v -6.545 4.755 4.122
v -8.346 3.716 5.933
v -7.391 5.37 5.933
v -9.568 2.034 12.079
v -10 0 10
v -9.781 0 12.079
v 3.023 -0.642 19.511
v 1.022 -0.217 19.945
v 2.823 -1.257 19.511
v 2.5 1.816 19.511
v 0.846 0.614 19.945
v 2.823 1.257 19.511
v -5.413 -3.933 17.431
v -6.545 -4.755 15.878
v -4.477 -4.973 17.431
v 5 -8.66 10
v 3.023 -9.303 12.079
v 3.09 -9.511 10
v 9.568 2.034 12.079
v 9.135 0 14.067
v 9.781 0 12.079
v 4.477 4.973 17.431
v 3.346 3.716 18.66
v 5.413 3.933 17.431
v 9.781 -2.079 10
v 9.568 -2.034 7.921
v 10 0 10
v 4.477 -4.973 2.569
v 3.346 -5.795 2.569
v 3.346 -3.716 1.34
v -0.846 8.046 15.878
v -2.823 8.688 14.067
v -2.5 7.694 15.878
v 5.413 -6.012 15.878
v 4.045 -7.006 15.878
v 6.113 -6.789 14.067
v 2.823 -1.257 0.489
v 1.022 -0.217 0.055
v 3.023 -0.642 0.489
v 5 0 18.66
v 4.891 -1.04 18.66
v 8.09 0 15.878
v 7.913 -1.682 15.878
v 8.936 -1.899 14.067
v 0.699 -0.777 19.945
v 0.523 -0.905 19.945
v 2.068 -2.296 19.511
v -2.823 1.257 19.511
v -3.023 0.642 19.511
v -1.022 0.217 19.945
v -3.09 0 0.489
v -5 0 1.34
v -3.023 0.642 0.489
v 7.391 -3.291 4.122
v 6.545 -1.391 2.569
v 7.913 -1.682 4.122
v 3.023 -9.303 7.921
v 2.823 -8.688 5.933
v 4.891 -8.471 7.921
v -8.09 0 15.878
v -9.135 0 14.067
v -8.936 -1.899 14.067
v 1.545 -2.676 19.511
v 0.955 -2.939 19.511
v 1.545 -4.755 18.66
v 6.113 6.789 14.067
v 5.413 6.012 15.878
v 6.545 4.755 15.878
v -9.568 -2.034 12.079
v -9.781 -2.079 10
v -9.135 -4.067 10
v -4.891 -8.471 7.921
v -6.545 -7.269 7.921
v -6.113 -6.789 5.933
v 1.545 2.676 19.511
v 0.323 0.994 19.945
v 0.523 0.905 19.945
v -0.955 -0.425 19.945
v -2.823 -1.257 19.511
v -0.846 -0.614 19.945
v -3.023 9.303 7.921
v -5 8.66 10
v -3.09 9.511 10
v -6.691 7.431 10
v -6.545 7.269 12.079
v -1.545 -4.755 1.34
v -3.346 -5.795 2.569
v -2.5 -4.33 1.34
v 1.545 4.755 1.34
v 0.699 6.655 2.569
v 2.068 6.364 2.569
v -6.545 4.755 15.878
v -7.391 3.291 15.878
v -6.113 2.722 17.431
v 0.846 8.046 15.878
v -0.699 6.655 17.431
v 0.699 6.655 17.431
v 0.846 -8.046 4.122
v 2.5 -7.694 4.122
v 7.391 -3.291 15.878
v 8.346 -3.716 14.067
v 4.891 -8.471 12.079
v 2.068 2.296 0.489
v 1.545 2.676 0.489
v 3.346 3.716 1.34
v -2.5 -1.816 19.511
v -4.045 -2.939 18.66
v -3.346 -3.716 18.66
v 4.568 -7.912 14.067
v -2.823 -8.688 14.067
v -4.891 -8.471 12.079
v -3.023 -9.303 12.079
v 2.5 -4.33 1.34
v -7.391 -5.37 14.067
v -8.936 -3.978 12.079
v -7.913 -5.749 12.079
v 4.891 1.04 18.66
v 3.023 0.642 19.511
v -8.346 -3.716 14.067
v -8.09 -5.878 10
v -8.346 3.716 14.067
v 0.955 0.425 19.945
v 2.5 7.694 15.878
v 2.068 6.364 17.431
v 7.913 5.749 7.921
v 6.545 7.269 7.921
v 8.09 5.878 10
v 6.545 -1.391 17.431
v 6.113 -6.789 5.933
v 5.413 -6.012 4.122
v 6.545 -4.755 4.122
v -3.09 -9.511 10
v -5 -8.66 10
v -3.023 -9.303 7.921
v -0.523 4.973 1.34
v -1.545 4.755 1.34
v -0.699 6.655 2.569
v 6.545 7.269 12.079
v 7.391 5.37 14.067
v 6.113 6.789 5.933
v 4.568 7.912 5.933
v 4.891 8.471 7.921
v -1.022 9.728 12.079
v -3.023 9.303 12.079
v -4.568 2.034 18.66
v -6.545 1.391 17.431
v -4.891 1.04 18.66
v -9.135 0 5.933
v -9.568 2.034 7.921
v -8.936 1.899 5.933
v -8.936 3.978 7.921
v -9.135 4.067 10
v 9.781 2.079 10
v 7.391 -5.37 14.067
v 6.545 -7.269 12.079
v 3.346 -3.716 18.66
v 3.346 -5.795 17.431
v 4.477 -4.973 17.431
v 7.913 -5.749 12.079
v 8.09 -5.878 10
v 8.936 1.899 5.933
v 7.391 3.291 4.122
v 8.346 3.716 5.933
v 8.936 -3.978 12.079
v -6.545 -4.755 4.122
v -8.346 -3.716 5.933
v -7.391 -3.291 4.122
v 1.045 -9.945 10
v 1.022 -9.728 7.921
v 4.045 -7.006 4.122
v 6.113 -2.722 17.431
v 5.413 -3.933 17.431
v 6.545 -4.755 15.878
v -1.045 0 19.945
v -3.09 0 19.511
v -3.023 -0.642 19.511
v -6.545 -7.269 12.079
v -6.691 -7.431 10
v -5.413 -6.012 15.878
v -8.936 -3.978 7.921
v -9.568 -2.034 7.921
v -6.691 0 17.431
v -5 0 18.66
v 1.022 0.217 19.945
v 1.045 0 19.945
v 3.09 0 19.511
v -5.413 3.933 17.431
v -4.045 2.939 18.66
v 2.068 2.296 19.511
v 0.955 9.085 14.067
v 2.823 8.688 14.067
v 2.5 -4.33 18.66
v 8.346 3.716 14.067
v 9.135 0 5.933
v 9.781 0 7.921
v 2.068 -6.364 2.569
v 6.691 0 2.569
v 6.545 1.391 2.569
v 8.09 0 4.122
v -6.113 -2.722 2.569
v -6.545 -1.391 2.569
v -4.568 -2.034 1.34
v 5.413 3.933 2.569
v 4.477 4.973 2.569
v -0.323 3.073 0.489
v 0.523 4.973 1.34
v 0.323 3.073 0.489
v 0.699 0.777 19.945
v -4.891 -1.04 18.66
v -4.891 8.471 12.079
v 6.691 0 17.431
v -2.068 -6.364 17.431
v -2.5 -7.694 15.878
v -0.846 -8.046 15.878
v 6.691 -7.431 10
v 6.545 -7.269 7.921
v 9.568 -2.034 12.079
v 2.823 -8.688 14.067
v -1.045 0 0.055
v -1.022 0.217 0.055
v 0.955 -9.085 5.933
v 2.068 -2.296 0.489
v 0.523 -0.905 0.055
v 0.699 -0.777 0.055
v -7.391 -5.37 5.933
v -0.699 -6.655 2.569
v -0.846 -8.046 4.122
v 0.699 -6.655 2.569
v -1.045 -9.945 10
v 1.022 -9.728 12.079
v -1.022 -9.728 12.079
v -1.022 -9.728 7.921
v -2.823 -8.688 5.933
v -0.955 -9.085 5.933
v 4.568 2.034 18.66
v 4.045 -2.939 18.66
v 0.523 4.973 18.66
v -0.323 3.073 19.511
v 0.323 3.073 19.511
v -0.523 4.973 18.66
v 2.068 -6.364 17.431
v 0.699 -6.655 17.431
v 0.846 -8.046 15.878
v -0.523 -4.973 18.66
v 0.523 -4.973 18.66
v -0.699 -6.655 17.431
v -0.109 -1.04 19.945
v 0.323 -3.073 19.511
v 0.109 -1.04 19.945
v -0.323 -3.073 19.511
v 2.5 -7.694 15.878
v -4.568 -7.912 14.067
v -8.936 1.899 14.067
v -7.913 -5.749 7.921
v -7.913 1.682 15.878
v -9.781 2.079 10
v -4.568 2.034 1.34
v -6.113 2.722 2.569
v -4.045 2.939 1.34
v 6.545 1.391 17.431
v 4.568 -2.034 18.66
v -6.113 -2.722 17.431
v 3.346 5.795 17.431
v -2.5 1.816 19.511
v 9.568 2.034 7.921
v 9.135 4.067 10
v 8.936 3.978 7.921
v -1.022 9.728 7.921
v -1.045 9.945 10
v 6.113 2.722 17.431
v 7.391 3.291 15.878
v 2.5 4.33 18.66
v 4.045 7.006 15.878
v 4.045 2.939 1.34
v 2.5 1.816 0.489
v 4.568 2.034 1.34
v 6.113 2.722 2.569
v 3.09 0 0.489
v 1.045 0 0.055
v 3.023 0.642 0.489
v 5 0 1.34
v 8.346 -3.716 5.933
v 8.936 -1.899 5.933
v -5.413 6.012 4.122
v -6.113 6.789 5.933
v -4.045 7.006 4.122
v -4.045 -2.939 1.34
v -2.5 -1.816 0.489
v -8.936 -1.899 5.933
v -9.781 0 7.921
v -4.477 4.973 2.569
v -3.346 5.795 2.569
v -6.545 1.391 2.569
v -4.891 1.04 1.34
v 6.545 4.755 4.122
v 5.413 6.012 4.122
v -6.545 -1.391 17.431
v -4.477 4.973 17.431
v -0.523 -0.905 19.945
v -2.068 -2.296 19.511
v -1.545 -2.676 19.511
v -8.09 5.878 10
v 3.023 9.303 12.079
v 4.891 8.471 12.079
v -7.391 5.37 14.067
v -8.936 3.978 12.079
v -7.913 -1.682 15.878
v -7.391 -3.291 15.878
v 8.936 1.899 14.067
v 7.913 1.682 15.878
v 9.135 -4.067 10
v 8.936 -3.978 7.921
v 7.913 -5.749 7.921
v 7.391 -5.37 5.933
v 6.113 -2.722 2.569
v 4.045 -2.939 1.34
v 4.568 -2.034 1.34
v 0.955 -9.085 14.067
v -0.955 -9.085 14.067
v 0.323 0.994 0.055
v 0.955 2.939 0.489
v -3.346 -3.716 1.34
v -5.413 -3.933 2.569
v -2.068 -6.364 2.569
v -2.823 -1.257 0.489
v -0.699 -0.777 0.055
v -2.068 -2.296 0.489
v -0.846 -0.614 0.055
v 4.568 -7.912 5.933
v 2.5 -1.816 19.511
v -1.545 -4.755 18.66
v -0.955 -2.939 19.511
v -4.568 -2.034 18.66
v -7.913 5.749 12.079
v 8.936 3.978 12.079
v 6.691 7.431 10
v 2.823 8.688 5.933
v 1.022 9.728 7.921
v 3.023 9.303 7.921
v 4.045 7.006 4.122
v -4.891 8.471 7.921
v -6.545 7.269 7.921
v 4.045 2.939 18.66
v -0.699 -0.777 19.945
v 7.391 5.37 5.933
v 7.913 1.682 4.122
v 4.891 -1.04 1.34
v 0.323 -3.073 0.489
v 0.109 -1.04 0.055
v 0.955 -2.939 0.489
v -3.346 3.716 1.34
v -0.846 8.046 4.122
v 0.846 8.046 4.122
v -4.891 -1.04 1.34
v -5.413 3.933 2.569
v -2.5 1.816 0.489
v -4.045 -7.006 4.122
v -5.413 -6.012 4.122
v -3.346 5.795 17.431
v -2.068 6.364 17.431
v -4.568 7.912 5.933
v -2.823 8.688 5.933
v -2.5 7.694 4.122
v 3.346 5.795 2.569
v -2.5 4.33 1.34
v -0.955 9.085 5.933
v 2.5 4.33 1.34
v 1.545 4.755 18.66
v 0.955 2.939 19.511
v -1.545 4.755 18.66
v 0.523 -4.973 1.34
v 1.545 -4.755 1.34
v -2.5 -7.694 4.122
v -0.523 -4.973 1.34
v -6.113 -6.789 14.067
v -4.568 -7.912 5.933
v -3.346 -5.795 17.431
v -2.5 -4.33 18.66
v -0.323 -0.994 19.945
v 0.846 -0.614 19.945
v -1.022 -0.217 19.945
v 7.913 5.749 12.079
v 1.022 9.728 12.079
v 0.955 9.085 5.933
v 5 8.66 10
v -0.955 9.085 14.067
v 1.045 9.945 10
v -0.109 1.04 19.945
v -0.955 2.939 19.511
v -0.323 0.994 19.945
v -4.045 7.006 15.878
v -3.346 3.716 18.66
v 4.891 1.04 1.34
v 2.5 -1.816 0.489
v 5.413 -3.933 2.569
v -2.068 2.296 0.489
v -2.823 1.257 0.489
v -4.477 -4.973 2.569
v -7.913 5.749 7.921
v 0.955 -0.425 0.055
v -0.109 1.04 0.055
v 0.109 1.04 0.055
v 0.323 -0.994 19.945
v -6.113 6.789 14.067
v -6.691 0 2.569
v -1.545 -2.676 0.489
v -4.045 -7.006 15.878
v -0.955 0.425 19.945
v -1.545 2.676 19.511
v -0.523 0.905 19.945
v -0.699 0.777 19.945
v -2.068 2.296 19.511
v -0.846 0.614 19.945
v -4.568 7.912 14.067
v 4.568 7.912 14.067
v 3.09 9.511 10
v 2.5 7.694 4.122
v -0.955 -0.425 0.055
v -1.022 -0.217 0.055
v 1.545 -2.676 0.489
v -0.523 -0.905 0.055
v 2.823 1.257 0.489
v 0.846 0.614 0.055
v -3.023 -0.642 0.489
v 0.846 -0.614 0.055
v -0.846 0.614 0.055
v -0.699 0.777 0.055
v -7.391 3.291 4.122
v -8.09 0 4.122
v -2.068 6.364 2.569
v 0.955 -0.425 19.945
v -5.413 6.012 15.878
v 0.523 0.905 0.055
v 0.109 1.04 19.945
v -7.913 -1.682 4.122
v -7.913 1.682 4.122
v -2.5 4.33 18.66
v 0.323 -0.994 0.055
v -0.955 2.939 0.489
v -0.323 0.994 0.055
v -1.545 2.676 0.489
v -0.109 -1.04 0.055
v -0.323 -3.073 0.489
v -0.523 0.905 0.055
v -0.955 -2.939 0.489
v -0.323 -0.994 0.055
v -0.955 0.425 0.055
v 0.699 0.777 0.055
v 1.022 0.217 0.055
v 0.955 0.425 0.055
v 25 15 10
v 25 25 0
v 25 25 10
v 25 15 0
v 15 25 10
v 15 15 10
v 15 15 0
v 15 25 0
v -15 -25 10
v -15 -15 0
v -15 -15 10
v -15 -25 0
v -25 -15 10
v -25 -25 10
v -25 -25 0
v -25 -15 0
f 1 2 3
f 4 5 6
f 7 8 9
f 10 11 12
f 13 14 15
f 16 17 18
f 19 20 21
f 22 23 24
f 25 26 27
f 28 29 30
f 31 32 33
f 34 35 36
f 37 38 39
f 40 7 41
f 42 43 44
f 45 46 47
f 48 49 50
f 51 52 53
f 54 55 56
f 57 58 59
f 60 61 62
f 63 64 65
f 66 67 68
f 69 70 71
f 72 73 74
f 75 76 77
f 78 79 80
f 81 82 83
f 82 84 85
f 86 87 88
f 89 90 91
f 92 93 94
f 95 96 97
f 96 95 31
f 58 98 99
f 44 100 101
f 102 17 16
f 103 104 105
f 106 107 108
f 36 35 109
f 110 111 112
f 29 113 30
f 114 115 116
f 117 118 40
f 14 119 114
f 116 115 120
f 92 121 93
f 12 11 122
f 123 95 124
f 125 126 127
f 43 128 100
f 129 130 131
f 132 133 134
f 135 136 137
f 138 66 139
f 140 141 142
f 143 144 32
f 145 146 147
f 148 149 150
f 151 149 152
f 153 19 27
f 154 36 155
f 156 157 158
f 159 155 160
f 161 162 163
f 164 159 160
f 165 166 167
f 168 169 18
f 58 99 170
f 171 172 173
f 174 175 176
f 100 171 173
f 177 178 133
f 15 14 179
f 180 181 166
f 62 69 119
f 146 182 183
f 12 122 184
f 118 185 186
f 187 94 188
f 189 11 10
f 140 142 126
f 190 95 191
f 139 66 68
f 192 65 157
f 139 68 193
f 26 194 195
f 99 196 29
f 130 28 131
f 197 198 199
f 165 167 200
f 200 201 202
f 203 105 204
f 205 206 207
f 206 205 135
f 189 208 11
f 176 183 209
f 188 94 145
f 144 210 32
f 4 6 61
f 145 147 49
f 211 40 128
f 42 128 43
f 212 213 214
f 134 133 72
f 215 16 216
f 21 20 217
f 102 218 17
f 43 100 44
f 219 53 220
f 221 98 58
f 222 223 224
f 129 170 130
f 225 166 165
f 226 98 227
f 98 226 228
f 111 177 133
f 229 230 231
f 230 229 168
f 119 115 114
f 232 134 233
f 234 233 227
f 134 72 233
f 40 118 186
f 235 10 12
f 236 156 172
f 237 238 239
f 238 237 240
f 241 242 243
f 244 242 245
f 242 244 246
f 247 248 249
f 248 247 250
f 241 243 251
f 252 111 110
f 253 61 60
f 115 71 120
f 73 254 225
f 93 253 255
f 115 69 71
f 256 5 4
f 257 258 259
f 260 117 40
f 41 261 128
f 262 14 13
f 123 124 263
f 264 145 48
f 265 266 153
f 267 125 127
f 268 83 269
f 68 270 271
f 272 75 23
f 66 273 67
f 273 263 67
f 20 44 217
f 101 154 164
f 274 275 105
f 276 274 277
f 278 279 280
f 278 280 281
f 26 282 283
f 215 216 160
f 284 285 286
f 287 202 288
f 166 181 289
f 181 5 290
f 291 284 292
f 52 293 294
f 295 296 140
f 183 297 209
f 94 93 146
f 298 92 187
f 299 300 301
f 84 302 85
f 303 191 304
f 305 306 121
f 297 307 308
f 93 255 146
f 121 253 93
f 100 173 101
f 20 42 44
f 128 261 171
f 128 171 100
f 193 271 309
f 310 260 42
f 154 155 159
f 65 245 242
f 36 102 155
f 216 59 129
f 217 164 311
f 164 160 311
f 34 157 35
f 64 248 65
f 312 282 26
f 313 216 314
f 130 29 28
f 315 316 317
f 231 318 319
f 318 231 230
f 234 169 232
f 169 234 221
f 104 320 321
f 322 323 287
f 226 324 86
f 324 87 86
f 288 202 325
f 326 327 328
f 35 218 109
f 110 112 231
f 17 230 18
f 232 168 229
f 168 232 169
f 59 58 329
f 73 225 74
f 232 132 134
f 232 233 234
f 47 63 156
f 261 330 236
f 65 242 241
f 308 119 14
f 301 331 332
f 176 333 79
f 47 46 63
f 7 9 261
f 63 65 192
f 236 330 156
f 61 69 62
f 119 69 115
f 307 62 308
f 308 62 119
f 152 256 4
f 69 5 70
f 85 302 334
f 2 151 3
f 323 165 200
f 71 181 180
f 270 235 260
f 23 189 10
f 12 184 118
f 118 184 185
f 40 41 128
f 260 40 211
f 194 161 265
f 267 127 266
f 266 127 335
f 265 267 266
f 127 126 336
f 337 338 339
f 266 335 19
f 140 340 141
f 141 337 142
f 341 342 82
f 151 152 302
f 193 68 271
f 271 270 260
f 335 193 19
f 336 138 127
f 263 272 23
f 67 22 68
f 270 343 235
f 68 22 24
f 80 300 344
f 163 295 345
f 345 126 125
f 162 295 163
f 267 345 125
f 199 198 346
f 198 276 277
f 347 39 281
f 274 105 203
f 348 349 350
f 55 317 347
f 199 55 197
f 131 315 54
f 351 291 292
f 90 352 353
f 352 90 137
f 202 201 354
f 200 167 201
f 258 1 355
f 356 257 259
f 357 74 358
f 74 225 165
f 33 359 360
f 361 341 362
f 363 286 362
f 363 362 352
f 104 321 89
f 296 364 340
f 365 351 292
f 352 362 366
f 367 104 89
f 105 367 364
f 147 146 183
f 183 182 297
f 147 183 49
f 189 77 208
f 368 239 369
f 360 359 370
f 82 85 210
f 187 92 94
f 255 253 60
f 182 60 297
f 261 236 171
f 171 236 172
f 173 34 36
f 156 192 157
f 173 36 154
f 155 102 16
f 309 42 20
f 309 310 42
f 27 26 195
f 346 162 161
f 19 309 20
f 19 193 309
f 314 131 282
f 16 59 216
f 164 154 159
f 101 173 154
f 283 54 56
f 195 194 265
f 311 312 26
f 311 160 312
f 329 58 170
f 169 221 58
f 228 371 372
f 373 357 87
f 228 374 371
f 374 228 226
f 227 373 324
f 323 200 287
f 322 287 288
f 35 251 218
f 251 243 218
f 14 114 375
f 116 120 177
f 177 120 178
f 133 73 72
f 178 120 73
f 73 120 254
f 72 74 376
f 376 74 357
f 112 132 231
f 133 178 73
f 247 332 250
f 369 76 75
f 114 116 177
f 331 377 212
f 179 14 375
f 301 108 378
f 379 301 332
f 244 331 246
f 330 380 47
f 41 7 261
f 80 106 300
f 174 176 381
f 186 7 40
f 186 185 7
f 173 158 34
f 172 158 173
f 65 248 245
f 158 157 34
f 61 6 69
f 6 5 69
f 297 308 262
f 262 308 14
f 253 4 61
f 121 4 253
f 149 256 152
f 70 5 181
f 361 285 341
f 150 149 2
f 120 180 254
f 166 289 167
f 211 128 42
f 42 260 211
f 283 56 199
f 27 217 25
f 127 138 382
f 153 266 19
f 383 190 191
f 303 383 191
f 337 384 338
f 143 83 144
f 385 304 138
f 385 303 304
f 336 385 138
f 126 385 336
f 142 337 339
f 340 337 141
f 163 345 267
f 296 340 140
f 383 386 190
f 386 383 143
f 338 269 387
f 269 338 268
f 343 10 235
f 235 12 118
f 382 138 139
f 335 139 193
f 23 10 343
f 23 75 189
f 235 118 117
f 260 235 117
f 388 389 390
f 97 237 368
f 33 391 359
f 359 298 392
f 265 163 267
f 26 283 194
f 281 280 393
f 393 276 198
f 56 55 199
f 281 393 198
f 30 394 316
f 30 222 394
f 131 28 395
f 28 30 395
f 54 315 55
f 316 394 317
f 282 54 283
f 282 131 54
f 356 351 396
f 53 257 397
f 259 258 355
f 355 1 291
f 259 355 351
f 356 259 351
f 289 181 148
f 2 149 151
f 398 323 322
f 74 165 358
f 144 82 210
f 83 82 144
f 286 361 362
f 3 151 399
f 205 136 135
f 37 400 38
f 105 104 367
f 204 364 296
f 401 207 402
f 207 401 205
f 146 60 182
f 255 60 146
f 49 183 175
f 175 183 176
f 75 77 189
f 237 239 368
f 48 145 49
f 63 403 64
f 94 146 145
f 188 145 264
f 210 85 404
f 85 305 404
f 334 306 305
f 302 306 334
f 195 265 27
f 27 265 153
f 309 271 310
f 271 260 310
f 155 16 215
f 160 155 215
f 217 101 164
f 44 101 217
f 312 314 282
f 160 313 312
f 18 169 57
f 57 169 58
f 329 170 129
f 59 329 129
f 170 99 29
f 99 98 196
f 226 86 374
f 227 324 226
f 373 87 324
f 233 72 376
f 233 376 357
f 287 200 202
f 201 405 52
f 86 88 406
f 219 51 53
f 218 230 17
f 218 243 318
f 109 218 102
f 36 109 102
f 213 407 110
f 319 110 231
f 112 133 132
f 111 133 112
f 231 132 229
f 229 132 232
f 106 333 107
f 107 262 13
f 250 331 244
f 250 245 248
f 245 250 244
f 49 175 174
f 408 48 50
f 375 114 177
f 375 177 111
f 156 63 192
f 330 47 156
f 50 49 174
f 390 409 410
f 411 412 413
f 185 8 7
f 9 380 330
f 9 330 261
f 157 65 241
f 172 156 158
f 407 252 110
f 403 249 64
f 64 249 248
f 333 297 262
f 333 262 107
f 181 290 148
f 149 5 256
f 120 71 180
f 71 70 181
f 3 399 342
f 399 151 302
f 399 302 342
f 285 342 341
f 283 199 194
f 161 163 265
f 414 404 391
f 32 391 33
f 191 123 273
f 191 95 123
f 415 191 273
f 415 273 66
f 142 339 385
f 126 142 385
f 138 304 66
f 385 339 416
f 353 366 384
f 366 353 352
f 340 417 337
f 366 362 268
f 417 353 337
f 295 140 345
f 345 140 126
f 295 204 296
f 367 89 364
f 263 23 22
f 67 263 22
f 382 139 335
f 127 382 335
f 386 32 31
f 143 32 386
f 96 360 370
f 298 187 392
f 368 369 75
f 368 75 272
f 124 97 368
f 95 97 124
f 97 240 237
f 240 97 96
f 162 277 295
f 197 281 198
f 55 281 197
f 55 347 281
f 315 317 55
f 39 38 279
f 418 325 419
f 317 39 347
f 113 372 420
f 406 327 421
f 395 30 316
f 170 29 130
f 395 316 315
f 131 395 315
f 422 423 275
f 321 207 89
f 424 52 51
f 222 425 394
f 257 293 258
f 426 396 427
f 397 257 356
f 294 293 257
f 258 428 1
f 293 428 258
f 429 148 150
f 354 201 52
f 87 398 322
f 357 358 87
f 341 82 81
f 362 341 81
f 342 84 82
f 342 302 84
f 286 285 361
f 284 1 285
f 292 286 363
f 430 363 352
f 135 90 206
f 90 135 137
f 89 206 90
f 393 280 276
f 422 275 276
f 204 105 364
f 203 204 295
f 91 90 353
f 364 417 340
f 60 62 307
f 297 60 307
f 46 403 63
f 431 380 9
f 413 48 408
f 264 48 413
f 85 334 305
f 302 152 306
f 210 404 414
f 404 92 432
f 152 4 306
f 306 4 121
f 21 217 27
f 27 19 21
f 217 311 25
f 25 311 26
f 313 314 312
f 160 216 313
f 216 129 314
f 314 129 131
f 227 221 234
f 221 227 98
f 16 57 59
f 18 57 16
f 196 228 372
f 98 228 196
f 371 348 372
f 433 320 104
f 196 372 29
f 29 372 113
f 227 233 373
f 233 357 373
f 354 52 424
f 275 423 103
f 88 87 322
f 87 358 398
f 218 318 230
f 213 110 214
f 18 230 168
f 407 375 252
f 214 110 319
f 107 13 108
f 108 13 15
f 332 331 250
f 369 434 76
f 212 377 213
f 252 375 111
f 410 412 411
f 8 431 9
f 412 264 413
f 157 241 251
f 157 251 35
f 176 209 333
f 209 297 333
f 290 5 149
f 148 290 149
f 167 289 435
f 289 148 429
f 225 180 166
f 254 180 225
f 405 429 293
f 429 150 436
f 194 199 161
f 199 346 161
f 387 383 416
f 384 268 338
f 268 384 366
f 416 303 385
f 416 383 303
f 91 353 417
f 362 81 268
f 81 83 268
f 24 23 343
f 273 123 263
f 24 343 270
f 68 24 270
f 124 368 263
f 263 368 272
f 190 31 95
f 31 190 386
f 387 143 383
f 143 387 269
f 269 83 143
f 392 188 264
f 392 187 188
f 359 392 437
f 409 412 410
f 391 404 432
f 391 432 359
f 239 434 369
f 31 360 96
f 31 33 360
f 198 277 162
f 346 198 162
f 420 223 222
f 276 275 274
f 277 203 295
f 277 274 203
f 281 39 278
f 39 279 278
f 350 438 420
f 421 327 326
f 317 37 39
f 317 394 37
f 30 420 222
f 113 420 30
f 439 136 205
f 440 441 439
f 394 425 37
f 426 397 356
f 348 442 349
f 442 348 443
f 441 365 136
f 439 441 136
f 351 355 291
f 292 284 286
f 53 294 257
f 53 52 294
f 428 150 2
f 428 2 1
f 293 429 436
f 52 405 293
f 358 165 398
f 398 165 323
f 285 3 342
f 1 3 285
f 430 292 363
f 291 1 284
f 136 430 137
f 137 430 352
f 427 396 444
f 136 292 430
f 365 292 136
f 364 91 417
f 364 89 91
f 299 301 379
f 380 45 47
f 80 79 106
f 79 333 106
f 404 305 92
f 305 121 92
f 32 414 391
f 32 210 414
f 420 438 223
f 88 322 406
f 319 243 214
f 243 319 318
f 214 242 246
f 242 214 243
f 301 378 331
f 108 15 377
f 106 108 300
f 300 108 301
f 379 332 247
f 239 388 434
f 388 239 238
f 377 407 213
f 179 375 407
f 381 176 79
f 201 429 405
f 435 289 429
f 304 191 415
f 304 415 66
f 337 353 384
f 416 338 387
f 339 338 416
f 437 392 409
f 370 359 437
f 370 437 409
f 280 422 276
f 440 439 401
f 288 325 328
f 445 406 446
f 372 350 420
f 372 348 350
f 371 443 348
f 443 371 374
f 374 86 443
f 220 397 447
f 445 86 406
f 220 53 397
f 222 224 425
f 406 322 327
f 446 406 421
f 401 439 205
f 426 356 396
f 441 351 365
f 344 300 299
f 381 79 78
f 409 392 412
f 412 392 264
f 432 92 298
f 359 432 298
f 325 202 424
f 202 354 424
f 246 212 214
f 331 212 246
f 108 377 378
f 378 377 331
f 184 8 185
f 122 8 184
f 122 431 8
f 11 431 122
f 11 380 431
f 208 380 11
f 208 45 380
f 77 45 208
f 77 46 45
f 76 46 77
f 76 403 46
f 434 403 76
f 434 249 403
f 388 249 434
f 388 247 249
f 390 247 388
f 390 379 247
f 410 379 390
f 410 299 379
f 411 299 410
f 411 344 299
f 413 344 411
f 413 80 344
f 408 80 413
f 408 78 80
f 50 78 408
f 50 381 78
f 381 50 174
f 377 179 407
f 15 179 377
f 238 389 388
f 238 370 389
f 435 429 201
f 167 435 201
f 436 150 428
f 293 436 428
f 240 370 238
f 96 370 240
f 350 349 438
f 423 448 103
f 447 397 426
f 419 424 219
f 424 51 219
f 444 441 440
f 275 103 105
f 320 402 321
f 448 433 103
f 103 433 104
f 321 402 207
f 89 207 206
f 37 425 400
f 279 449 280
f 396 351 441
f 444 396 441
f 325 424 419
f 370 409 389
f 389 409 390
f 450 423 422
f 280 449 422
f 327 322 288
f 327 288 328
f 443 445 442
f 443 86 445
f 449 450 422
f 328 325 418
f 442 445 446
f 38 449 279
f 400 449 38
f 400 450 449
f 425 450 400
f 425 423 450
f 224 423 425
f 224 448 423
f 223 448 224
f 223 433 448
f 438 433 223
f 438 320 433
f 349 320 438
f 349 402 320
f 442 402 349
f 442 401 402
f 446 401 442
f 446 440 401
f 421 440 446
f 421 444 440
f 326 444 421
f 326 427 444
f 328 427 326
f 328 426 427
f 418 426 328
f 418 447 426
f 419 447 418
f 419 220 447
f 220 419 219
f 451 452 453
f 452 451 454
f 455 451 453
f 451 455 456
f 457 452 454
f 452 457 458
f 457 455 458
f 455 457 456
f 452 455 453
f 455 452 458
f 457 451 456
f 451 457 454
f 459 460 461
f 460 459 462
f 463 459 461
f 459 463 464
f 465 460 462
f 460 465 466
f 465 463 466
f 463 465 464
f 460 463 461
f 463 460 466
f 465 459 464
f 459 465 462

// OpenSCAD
translate([0,0,10])
	sphere(10);
translate([15,15,0])
	cube(10,10,10);
translate([-25,-25,0])
	cube(10,10,10);
